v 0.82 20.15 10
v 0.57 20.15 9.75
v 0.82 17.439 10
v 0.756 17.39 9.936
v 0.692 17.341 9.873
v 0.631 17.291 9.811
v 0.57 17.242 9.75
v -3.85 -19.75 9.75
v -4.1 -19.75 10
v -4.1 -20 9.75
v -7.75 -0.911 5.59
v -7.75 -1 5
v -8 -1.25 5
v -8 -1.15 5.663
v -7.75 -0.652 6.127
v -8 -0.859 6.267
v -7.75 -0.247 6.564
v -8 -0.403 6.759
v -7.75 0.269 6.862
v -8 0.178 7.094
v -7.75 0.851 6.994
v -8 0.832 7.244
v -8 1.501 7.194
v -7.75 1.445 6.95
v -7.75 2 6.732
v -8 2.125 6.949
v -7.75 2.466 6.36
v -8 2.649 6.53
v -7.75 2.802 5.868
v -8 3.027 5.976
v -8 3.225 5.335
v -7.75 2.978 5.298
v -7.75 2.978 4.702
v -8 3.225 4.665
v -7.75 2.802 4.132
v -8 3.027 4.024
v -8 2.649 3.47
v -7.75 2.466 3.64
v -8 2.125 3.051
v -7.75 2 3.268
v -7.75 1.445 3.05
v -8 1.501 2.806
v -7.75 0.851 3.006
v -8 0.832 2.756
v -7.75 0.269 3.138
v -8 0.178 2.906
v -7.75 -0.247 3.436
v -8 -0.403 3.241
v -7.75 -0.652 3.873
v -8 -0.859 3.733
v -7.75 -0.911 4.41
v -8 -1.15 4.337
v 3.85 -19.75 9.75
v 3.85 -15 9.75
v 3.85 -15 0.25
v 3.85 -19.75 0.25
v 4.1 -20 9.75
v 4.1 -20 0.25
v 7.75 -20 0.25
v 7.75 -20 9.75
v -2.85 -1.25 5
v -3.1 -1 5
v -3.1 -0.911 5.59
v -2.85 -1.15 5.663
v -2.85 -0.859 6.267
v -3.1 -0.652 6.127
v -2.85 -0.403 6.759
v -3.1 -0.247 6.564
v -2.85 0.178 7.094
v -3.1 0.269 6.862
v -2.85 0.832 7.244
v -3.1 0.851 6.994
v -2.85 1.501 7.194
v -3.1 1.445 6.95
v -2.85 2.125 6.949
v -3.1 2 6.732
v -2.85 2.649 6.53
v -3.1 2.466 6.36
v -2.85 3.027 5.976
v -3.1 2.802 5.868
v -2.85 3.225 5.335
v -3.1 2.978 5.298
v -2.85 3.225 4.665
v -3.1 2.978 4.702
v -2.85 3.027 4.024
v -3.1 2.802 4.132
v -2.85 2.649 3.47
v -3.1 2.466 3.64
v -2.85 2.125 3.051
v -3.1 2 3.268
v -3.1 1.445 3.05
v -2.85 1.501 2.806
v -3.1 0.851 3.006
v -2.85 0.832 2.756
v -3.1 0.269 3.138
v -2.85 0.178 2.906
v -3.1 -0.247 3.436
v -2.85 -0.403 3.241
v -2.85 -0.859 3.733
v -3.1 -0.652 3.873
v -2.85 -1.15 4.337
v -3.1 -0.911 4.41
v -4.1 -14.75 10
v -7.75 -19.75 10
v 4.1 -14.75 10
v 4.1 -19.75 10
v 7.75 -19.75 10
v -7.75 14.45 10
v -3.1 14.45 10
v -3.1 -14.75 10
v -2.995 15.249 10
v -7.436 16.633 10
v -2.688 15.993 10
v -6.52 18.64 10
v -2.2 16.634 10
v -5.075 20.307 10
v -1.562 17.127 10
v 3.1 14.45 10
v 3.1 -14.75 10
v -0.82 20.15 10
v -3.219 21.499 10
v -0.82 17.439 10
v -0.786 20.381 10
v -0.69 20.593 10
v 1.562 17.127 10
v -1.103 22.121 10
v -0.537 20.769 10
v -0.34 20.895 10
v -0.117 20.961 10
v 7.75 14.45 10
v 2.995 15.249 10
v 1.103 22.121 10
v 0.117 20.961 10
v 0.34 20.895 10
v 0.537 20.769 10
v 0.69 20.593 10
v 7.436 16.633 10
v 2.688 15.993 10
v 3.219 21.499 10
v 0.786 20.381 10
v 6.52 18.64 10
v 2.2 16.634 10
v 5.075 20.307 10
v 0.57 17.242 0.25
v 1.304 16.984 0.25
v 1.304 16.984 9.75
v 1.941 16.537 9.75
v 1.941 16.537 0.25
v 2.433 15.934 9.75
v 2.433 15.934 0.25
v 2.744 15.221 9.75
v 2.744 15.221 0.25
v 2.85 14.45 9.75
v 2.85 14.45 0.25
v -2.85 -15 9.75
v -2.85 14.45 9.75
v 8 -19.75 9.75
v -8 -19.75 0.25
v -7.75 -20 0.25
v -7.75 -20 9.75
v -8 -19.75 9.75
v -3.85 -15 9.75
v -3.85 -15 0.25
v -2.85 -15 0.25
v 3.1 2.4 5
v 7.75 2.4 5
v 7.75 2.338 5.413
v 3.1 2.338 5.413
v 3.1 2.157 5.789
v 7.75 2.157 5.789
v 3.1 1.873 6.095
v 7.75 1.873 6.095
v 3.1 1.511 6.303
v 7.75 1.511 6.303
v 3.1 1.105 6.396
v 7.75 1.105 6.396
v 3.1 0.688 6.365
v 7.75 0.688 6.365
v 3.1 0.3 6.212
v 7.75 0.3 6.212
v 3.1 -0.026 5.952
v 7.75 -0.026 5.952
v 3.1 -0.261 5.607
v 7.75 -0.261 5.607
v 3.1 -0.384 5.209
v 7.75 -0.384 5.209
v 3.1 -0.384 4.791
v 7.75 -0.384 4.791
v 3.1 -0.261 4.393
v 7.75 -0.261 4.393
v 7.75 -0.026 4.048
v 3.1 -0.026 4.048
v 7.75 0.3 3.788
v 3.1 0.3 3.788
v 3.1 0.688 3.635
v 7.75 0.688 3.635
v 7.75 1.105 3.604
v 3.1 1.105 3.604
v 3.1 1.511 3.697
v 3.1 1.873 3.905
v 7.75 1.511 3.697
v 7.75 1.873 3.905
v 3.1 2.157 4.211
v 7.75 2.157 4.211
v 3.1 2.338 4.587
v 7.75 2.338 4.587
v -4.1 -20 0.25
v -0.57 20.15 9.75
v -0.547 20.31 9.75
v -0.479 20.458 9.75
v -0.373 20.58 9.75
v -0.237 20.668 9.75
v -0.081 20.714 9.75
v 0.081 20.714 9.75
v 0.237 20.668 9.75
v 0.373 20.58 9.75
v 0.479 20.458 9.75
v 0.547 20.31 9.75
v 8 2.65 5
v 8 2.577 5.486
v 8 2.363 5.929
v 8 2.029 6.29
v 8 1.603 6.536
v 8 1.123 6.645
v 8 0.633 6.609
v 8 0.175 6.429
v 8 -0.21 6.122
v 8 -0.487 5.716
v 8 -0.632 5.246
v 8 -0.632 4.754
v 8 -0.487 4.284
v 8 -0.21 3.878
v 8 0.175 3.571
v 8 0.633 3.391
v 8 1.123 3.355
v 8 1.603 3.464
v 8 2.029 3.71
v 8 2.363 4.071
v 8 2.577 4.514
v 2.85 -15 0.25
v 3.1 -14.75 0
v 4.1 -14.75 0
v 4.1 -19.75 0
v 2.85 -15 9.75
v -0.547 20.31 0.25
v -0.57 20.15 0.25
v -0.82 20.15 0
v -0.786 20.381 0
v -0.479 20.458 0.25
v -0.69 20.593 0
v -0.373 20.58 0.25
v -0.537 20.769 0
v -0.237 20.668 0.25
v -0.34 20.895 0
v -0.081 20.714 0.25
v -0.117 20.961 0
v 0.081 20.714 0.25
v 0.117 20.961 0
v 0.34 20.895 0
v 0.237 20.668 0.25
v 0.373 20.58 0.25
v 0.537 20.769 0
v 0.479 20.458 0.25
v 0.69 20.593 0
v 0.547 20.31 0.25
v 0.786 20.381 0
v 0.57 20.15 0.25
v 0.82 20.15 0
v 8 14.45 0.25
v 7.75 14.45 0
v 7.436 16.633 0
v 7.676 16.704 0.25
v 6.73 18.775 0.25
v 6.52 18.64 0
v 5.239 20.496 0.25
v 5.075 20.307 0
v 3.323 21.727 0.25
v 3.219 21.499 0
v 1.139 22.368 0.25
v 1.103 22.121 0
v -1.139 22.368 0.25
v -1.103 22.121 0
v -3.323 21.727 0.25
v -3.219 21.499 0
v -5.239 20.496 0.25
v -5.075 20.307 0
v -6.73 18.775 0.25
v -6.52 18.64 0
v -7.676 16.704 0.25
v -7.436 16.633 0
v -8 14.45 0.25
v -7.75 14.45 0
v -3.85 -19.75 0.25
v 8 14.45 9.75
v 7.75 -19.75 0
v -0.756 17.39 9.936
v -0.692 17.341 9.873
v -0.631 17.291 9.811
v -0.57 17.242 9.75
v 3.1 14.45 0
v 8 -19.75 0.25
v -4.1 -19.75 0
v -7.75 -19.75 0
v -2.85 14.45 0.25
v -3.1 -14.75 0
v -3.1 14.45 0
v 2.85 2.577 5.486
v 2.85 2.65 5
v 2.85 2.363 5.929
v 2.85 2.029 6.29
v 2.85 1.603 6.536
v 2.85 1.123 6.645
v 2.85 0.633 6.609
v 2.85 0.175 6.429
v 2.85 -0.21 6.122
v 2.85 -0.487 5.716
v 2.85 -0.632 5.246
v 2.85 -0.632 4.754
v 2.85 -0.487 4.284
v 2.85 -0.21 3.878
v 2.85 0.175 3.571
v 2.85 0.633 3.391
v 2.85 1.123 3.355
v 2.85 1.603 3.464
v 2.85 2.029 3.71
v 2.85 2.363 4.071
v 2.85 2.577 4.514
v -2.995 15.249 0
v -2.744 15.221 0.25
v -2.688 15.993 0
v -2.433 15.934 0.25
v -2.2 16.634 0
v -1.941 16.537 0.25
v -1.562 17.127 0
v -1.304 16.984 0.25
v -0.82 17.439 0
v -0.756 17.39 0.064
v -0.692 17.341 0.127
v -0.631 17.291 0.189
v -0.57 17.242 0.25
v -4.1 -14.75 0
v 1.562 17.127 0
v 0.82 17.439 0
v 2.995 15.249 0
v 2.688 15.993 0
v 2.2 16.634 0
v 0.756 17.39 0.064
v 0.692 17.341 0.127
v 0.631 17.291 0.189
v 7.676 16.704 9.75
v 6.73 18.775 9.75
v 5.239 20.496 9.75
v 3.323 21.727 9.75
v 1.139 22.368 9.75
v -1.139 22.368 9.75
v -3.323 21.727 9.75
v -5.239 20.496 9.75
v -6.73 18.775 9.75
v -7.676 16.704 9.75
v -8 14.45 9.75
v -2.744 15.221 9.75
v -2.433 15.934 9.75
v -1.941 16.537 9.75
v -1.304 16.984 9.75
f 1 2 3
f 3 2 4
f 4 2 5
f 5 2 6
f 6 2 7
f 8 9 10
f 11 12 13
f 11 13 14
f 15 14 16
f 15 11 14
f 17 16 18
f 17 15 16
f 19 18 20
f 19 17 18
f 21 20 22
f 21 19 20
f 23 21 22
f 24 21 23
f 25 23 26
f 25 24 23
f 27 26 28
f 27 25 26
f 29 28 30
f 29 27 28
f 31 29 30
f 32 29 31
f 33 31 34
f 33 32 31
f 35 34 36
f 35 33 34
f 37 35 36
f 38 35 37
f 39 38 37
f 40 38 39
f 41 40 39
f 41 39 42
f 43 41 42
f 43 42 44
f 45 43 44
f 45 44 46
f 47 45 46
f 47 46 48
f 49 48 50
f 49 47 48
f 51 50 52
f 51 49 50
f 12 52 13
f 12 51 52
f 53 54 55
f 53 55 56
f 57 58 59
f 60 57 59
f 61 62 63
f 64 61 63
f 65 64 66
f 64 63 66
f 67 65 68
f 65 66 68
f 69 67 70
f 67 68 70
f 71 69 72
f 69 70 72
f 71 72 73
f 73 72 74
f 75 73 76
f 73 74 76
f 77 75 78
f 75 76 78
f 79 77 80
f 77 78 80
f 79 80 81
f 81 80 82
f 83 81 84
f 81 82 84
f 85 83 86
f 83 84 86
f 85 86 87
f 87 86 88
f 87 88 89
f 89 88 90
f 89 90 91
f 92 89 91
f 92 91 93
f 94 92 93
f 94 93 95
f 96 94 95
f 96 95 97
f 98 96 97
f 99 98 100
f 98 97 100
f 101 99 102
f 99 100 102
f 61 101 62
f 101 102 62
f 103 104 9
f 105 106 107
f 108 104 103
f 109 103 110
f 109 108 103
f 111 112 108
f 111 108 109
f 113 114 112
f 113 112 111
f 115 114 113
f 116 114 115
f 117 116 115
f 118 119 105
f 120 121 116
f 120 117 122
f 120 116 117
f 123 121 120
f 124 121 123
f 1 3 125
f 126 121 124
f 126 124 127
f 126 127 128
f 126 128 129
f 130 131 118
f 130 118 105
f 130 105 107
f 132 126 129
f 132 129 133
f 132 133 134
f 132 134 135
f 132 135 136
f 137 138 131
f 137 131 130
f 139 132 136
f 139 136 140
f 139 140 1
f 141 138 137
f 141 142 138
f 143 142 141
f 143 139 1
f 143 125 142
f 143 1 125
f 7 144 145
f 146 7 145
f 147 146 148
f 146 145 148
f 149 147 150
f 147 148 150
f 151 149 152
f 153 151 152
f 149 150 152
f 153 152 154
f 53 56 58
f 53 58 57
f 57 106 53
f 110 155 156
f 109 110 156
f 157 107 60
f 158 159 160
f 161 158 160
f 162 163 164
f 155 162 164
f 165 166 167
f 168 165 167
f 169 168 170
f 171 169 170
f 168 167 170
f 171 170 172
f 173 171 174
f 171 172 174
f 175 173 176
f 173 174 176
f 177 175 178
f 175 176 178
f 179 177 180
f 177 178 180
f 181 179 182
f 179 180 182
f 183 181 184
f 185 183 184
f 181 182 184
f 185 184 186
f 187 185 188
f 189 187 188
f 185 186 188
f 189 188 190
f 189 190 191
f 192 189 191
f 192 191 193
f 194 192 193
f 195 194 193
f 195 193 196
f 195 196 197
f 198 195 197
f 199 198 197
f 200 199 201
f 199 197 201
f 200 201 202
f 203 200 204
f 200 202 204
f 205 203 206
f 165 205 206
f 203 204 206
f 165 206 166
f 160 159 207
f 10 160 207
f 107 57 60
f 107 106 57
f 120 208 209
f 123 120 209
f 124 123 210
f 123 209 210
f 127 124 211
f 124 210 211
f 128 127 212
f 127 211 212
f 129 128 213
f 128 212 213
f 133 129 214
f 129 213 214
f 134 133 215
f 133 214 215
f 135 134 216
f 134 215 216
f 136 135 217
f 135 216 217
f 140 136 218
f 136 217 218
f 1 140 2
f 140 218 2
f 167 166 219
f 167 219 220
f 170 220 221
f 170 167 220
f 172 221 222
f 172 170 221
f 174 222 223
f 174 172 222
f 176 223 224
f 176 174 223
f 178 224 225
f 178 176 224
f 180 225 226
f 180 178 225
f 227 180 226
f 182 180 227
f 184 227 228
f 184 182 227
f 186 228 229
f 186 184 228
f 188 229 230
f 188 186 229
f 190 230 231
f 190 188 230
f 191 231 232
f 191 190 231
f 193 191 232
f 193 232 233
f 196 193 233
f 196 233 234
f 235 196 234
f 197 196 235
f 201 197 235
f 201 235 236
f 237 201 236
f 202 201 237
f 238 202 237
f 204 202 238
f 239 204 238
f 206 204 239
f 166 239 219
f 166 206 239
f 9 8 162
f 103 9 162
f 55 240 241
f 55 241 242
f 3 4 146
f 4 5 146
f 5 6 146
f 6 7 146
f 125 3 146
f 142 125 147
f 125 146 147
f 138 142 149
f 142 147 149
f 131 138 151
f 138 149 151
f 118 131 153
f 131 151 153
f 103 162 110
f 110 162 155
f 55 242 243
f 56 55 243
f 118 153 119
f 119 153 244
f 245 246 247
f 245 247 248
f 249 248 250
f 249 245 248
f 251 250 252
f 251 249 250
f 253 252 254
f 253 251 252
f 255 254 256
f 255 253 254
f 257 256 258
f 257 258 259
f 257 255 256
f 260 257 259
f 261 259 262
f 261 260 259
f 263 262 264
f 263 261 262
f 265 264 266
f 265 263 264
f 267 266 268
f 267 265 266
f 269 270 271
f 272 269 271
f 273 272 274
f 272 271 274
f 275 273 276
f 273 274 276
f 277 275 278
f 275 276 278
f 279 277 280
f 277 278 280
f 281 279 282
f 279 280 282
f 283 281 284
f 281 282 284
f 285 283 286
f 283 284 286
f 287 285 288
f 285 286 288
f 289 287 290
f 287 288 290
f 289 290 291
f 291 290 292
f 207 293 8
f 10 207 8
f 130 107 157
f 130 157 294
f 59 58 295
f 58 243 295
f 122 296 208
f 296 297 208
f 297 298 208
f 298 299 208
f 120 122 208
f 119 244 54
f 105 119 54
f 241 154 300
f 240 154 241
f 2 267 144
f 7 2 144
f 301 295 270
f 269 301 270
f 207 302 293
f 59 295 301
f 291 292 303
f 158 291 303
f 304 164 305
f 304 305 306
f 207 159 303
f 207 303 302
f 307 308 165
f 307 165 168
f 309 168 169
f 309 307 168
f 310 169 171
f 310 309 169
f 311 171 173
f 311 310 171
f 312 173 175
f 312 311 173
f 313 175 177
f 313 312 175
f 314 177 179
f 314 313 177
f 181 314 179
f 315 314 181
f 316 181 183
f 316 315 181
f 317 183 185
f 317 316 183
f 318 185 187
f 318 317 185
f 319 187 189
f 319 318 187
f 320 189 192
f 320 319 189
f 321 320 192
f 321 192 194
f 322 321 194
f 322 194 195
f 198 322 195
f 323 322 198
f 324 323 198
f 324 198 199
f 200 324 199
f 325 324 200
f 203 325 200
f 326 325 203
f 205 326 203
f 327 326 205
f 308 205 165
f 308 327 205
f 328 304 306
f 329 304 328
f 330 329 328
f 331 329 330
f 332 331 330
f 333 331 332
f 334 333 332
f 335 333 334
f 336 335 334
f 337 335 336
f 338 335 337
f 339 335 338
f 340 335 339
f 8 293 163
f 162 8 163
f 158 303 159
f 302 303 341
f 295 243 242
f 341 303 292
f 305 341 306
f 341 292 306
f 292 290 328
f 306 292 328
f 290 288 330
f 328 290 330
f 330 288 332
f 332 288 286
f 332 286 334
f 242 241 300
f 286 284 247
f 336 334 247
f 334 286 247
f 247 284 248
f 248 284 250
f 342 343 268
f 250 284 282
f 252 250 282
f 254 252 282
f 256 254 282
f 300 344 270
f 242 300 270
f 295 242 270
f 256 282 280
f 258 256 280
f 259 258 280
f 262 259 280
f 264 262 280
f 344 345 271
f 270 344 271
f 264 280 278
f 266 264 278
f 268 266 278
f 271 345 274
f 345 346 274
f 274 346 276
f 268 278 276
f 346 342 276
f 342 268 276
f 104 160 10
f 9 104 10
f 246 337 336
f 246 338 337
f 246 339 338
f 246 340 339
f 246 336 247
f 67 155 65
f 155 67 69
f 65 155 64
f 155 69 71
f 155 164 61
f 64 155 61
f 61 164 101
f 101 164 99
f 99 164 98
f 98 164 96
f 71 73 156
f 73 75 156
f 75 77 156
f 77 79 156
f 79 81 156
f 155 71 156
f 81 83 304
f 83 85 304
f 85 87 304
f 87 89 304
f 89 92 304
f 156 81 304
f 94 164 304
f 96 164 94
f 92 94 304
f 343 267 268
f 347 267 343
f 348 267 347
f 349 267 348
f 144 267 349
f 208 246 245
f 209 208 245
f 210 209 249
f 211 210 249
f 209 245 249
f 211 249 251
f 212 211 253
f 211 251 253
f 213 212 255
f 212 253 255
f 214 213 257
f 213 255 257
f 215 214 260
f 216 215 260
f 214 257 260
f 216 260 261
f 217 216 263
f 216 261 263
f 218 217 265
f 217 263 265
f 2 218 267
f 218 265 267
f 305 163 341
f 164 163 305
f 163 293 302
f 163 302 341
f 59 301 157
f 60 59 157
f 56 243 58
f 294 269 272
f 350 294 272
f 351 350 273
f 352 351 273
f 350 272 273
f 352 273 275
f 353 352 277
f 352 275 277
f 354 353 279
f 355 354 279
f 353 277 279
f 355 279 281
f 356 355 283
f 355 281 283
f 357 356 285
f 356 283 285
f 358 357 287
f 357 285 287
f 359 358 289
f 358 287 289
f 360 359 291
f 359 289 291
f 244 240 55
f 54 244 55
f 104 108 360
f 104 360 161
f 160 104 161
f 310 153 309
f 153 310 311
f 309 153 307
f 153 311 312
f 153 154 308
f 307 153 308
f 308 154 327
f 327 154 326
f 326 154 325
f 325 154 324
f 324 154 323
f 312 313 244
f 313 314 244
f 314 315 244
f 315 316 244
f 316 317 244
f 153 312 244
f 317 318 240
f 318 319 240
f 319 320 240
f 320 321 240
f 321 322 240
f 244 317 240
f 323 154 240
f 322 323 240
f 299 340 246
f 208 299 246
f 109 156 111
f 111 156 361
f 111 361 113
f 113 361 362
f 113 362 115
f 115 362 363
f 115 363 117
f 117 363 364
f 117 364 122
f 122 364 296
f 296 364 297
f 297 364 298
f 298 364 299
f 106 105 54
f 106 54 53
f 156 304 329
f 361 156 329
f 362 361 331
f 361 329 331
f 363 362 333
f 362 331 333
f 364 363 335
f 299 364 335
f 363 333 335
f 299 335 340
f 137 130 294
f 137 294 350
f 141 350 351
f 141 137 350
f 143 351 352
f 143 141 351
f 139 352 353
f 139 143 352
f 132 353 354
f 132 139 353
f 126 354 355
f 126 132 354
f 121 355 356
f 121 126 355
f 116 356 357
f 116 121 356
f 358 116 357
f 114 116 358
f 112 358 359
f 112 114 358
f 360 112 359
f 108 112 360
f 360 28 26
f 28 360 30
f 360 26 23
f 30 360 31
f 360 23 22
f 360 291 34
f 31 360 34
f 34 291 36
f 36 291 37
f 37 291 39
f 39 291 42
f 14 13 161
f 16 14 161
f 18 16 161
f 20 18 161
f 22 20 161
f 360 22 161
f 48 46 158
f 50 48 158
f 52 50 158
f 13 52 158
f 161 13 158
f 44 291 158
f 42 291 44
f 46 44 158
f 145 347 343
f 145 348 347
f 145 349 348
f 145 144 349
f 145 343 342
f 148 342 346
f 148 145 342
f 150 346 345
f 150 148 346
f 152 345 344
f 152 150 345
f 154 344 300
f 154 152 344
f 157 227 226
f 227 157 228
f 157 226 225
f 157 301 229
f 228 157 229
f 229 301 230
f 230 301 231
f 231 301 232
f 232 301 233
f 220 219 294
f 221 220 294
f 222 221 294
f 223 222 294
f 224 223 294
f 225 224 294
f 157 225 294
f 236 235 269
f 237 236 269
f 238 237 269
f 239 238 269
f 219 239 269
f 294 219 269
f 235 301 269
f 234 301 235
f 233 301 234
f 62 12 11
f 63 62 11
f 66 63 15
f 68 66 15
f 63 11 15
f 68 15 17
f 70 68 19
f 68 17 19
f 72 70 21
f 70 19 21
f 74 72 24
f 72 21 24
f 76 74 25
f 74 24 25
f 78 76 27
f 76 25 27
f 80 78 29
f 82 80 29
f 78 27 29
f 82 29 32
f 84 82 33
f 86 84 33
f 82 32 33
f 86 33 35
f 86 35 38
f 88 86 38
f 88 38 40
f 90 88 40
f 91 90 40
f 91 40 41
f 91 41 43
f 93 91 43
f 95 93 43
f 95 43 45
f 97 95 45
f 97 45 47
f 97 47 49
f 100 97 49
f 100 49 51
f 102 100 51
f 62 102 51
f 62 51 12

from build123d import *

# Parameters (mm, degrees)
F1_DEPTH       = 10
F3_D           = 2.8
F3_CBORE_D     = 4
F3_CBORE_DEPTH = 6
F4_SIZE        = 0.25


with BuildPart() as f1:
    # F0 (on Top) → F1 (new body)
    with BuildSketch(Plane.XY):
        with BuildLine():
            Line((3.85, -20), (8, -20))
            Line((8, -20), (8, 14.4496737048))
            ThreePointArc((8, 14.4496737048), (0, 22.4496737048), (-8, 14.4496737048))
            Line((-8, 14.4496737048), (-8, -20))
            Line((-8, -20), (-3.85, -20))
            Line((-3.85, -20), (-3.85, -15))
            Line((-3.85, -15), (-2.85, -15))
            Line((-2.85, -15), (-2.85, 14.4496737048))
            ThreePointArc((-2.85, 14.4496737048), (-2.2074806008, 16.252318816), (-0.5696284934, 17.2421678193))
            Line((-0.5696284934, 17.2421678193), (-0.5696284934, 20.1496737048))
            ThreePointArc((-0.5696284934, 20.1496737048), (0, 20.7193021982), (0.5696284934, 20.1496737048))
            Line((0.5696284934, 20.1496737048), (0.5696284934, 17.2421678193))
            ThreePointArc((0.5696284934, 17.2421678193), (2.2074806008, 16.252318816), (2.85, 14.4496737048))
            Line((2.85, 14.4496737048), (2.85, -15))
            Line((2.85, -15), (3.85, -15))
            Line((3.85, -15), (3.85, -20))
        make_face()
    extrude(amount=F1_DEPTH)

    # F3 (through all)
    with Locations(Plane(origin=(-8, 0, 0), x_dir=(0, -1, 0), z_dir=(-1, 0, 0))):
        with Locations((-1, 5)):
            CounterBoreHole(F3_D / 2, F3_CBORE_D / 2, F3_CBORE_DEPTH)

    # F4
    f4_edges = [f1.edges().sort_by_distance(p)[0] for p in [
        (5.925, -20, 0),
        (8, -2.775163, 0),
        (0, 22.449674, 0),
        (-8, -2.775163, 0),
        (-5.925, -20, 0),
        (-3.85, -17.5, 0),
        (-3.35, -15, 0),
        (-2.85, -0.275163, 0),
        (-2.207481, 16.252319, 0),
        (-0.569628, 18.695921, 0),
        (0, 20.719302, 0),
        (0.569628, 18.695921, 0),
        (2.207481, 16.252319, 0),
        (2.85, -0.275163, 0),
        (3.35, -15, 0),
        (3.85, -17.5, 0),
        (5.925, -20, 10),
        (8, -2.775163, 10),
        (0, 22.449674, 10),
        (-8, -2.775163, 10),
        (-5.925, -20, 10),
        (-3.85, -17.5, 10),
        (-3.35, -15, 10),
        (-2.85, -0.275163, 10),
        (-2.207481, 16.252319, 10),
        (-0.569628, 18.695921, 10),
        (0, 20.719302, 10),
        (0.569628, 18.695921, 10),
        (2.207481, 16.252319, 10),
        (2.85, -0.275163, 10),
        (3.35, -15, 10),
        (3.85, -17.5, 10),
        (-8, -20, 5),
        (-3.85, -20, 5),
        (3.85, -20, 5),
        (8, -20, 5),
        (8, 2.4, 5),
        (2.85, 2.4, 5),
        (-8, 3, 5),
        (-2.85, 3, 5),
    ]]
    chamfer(f4_edges, length=F4_SIZE)


solid = f1.part
